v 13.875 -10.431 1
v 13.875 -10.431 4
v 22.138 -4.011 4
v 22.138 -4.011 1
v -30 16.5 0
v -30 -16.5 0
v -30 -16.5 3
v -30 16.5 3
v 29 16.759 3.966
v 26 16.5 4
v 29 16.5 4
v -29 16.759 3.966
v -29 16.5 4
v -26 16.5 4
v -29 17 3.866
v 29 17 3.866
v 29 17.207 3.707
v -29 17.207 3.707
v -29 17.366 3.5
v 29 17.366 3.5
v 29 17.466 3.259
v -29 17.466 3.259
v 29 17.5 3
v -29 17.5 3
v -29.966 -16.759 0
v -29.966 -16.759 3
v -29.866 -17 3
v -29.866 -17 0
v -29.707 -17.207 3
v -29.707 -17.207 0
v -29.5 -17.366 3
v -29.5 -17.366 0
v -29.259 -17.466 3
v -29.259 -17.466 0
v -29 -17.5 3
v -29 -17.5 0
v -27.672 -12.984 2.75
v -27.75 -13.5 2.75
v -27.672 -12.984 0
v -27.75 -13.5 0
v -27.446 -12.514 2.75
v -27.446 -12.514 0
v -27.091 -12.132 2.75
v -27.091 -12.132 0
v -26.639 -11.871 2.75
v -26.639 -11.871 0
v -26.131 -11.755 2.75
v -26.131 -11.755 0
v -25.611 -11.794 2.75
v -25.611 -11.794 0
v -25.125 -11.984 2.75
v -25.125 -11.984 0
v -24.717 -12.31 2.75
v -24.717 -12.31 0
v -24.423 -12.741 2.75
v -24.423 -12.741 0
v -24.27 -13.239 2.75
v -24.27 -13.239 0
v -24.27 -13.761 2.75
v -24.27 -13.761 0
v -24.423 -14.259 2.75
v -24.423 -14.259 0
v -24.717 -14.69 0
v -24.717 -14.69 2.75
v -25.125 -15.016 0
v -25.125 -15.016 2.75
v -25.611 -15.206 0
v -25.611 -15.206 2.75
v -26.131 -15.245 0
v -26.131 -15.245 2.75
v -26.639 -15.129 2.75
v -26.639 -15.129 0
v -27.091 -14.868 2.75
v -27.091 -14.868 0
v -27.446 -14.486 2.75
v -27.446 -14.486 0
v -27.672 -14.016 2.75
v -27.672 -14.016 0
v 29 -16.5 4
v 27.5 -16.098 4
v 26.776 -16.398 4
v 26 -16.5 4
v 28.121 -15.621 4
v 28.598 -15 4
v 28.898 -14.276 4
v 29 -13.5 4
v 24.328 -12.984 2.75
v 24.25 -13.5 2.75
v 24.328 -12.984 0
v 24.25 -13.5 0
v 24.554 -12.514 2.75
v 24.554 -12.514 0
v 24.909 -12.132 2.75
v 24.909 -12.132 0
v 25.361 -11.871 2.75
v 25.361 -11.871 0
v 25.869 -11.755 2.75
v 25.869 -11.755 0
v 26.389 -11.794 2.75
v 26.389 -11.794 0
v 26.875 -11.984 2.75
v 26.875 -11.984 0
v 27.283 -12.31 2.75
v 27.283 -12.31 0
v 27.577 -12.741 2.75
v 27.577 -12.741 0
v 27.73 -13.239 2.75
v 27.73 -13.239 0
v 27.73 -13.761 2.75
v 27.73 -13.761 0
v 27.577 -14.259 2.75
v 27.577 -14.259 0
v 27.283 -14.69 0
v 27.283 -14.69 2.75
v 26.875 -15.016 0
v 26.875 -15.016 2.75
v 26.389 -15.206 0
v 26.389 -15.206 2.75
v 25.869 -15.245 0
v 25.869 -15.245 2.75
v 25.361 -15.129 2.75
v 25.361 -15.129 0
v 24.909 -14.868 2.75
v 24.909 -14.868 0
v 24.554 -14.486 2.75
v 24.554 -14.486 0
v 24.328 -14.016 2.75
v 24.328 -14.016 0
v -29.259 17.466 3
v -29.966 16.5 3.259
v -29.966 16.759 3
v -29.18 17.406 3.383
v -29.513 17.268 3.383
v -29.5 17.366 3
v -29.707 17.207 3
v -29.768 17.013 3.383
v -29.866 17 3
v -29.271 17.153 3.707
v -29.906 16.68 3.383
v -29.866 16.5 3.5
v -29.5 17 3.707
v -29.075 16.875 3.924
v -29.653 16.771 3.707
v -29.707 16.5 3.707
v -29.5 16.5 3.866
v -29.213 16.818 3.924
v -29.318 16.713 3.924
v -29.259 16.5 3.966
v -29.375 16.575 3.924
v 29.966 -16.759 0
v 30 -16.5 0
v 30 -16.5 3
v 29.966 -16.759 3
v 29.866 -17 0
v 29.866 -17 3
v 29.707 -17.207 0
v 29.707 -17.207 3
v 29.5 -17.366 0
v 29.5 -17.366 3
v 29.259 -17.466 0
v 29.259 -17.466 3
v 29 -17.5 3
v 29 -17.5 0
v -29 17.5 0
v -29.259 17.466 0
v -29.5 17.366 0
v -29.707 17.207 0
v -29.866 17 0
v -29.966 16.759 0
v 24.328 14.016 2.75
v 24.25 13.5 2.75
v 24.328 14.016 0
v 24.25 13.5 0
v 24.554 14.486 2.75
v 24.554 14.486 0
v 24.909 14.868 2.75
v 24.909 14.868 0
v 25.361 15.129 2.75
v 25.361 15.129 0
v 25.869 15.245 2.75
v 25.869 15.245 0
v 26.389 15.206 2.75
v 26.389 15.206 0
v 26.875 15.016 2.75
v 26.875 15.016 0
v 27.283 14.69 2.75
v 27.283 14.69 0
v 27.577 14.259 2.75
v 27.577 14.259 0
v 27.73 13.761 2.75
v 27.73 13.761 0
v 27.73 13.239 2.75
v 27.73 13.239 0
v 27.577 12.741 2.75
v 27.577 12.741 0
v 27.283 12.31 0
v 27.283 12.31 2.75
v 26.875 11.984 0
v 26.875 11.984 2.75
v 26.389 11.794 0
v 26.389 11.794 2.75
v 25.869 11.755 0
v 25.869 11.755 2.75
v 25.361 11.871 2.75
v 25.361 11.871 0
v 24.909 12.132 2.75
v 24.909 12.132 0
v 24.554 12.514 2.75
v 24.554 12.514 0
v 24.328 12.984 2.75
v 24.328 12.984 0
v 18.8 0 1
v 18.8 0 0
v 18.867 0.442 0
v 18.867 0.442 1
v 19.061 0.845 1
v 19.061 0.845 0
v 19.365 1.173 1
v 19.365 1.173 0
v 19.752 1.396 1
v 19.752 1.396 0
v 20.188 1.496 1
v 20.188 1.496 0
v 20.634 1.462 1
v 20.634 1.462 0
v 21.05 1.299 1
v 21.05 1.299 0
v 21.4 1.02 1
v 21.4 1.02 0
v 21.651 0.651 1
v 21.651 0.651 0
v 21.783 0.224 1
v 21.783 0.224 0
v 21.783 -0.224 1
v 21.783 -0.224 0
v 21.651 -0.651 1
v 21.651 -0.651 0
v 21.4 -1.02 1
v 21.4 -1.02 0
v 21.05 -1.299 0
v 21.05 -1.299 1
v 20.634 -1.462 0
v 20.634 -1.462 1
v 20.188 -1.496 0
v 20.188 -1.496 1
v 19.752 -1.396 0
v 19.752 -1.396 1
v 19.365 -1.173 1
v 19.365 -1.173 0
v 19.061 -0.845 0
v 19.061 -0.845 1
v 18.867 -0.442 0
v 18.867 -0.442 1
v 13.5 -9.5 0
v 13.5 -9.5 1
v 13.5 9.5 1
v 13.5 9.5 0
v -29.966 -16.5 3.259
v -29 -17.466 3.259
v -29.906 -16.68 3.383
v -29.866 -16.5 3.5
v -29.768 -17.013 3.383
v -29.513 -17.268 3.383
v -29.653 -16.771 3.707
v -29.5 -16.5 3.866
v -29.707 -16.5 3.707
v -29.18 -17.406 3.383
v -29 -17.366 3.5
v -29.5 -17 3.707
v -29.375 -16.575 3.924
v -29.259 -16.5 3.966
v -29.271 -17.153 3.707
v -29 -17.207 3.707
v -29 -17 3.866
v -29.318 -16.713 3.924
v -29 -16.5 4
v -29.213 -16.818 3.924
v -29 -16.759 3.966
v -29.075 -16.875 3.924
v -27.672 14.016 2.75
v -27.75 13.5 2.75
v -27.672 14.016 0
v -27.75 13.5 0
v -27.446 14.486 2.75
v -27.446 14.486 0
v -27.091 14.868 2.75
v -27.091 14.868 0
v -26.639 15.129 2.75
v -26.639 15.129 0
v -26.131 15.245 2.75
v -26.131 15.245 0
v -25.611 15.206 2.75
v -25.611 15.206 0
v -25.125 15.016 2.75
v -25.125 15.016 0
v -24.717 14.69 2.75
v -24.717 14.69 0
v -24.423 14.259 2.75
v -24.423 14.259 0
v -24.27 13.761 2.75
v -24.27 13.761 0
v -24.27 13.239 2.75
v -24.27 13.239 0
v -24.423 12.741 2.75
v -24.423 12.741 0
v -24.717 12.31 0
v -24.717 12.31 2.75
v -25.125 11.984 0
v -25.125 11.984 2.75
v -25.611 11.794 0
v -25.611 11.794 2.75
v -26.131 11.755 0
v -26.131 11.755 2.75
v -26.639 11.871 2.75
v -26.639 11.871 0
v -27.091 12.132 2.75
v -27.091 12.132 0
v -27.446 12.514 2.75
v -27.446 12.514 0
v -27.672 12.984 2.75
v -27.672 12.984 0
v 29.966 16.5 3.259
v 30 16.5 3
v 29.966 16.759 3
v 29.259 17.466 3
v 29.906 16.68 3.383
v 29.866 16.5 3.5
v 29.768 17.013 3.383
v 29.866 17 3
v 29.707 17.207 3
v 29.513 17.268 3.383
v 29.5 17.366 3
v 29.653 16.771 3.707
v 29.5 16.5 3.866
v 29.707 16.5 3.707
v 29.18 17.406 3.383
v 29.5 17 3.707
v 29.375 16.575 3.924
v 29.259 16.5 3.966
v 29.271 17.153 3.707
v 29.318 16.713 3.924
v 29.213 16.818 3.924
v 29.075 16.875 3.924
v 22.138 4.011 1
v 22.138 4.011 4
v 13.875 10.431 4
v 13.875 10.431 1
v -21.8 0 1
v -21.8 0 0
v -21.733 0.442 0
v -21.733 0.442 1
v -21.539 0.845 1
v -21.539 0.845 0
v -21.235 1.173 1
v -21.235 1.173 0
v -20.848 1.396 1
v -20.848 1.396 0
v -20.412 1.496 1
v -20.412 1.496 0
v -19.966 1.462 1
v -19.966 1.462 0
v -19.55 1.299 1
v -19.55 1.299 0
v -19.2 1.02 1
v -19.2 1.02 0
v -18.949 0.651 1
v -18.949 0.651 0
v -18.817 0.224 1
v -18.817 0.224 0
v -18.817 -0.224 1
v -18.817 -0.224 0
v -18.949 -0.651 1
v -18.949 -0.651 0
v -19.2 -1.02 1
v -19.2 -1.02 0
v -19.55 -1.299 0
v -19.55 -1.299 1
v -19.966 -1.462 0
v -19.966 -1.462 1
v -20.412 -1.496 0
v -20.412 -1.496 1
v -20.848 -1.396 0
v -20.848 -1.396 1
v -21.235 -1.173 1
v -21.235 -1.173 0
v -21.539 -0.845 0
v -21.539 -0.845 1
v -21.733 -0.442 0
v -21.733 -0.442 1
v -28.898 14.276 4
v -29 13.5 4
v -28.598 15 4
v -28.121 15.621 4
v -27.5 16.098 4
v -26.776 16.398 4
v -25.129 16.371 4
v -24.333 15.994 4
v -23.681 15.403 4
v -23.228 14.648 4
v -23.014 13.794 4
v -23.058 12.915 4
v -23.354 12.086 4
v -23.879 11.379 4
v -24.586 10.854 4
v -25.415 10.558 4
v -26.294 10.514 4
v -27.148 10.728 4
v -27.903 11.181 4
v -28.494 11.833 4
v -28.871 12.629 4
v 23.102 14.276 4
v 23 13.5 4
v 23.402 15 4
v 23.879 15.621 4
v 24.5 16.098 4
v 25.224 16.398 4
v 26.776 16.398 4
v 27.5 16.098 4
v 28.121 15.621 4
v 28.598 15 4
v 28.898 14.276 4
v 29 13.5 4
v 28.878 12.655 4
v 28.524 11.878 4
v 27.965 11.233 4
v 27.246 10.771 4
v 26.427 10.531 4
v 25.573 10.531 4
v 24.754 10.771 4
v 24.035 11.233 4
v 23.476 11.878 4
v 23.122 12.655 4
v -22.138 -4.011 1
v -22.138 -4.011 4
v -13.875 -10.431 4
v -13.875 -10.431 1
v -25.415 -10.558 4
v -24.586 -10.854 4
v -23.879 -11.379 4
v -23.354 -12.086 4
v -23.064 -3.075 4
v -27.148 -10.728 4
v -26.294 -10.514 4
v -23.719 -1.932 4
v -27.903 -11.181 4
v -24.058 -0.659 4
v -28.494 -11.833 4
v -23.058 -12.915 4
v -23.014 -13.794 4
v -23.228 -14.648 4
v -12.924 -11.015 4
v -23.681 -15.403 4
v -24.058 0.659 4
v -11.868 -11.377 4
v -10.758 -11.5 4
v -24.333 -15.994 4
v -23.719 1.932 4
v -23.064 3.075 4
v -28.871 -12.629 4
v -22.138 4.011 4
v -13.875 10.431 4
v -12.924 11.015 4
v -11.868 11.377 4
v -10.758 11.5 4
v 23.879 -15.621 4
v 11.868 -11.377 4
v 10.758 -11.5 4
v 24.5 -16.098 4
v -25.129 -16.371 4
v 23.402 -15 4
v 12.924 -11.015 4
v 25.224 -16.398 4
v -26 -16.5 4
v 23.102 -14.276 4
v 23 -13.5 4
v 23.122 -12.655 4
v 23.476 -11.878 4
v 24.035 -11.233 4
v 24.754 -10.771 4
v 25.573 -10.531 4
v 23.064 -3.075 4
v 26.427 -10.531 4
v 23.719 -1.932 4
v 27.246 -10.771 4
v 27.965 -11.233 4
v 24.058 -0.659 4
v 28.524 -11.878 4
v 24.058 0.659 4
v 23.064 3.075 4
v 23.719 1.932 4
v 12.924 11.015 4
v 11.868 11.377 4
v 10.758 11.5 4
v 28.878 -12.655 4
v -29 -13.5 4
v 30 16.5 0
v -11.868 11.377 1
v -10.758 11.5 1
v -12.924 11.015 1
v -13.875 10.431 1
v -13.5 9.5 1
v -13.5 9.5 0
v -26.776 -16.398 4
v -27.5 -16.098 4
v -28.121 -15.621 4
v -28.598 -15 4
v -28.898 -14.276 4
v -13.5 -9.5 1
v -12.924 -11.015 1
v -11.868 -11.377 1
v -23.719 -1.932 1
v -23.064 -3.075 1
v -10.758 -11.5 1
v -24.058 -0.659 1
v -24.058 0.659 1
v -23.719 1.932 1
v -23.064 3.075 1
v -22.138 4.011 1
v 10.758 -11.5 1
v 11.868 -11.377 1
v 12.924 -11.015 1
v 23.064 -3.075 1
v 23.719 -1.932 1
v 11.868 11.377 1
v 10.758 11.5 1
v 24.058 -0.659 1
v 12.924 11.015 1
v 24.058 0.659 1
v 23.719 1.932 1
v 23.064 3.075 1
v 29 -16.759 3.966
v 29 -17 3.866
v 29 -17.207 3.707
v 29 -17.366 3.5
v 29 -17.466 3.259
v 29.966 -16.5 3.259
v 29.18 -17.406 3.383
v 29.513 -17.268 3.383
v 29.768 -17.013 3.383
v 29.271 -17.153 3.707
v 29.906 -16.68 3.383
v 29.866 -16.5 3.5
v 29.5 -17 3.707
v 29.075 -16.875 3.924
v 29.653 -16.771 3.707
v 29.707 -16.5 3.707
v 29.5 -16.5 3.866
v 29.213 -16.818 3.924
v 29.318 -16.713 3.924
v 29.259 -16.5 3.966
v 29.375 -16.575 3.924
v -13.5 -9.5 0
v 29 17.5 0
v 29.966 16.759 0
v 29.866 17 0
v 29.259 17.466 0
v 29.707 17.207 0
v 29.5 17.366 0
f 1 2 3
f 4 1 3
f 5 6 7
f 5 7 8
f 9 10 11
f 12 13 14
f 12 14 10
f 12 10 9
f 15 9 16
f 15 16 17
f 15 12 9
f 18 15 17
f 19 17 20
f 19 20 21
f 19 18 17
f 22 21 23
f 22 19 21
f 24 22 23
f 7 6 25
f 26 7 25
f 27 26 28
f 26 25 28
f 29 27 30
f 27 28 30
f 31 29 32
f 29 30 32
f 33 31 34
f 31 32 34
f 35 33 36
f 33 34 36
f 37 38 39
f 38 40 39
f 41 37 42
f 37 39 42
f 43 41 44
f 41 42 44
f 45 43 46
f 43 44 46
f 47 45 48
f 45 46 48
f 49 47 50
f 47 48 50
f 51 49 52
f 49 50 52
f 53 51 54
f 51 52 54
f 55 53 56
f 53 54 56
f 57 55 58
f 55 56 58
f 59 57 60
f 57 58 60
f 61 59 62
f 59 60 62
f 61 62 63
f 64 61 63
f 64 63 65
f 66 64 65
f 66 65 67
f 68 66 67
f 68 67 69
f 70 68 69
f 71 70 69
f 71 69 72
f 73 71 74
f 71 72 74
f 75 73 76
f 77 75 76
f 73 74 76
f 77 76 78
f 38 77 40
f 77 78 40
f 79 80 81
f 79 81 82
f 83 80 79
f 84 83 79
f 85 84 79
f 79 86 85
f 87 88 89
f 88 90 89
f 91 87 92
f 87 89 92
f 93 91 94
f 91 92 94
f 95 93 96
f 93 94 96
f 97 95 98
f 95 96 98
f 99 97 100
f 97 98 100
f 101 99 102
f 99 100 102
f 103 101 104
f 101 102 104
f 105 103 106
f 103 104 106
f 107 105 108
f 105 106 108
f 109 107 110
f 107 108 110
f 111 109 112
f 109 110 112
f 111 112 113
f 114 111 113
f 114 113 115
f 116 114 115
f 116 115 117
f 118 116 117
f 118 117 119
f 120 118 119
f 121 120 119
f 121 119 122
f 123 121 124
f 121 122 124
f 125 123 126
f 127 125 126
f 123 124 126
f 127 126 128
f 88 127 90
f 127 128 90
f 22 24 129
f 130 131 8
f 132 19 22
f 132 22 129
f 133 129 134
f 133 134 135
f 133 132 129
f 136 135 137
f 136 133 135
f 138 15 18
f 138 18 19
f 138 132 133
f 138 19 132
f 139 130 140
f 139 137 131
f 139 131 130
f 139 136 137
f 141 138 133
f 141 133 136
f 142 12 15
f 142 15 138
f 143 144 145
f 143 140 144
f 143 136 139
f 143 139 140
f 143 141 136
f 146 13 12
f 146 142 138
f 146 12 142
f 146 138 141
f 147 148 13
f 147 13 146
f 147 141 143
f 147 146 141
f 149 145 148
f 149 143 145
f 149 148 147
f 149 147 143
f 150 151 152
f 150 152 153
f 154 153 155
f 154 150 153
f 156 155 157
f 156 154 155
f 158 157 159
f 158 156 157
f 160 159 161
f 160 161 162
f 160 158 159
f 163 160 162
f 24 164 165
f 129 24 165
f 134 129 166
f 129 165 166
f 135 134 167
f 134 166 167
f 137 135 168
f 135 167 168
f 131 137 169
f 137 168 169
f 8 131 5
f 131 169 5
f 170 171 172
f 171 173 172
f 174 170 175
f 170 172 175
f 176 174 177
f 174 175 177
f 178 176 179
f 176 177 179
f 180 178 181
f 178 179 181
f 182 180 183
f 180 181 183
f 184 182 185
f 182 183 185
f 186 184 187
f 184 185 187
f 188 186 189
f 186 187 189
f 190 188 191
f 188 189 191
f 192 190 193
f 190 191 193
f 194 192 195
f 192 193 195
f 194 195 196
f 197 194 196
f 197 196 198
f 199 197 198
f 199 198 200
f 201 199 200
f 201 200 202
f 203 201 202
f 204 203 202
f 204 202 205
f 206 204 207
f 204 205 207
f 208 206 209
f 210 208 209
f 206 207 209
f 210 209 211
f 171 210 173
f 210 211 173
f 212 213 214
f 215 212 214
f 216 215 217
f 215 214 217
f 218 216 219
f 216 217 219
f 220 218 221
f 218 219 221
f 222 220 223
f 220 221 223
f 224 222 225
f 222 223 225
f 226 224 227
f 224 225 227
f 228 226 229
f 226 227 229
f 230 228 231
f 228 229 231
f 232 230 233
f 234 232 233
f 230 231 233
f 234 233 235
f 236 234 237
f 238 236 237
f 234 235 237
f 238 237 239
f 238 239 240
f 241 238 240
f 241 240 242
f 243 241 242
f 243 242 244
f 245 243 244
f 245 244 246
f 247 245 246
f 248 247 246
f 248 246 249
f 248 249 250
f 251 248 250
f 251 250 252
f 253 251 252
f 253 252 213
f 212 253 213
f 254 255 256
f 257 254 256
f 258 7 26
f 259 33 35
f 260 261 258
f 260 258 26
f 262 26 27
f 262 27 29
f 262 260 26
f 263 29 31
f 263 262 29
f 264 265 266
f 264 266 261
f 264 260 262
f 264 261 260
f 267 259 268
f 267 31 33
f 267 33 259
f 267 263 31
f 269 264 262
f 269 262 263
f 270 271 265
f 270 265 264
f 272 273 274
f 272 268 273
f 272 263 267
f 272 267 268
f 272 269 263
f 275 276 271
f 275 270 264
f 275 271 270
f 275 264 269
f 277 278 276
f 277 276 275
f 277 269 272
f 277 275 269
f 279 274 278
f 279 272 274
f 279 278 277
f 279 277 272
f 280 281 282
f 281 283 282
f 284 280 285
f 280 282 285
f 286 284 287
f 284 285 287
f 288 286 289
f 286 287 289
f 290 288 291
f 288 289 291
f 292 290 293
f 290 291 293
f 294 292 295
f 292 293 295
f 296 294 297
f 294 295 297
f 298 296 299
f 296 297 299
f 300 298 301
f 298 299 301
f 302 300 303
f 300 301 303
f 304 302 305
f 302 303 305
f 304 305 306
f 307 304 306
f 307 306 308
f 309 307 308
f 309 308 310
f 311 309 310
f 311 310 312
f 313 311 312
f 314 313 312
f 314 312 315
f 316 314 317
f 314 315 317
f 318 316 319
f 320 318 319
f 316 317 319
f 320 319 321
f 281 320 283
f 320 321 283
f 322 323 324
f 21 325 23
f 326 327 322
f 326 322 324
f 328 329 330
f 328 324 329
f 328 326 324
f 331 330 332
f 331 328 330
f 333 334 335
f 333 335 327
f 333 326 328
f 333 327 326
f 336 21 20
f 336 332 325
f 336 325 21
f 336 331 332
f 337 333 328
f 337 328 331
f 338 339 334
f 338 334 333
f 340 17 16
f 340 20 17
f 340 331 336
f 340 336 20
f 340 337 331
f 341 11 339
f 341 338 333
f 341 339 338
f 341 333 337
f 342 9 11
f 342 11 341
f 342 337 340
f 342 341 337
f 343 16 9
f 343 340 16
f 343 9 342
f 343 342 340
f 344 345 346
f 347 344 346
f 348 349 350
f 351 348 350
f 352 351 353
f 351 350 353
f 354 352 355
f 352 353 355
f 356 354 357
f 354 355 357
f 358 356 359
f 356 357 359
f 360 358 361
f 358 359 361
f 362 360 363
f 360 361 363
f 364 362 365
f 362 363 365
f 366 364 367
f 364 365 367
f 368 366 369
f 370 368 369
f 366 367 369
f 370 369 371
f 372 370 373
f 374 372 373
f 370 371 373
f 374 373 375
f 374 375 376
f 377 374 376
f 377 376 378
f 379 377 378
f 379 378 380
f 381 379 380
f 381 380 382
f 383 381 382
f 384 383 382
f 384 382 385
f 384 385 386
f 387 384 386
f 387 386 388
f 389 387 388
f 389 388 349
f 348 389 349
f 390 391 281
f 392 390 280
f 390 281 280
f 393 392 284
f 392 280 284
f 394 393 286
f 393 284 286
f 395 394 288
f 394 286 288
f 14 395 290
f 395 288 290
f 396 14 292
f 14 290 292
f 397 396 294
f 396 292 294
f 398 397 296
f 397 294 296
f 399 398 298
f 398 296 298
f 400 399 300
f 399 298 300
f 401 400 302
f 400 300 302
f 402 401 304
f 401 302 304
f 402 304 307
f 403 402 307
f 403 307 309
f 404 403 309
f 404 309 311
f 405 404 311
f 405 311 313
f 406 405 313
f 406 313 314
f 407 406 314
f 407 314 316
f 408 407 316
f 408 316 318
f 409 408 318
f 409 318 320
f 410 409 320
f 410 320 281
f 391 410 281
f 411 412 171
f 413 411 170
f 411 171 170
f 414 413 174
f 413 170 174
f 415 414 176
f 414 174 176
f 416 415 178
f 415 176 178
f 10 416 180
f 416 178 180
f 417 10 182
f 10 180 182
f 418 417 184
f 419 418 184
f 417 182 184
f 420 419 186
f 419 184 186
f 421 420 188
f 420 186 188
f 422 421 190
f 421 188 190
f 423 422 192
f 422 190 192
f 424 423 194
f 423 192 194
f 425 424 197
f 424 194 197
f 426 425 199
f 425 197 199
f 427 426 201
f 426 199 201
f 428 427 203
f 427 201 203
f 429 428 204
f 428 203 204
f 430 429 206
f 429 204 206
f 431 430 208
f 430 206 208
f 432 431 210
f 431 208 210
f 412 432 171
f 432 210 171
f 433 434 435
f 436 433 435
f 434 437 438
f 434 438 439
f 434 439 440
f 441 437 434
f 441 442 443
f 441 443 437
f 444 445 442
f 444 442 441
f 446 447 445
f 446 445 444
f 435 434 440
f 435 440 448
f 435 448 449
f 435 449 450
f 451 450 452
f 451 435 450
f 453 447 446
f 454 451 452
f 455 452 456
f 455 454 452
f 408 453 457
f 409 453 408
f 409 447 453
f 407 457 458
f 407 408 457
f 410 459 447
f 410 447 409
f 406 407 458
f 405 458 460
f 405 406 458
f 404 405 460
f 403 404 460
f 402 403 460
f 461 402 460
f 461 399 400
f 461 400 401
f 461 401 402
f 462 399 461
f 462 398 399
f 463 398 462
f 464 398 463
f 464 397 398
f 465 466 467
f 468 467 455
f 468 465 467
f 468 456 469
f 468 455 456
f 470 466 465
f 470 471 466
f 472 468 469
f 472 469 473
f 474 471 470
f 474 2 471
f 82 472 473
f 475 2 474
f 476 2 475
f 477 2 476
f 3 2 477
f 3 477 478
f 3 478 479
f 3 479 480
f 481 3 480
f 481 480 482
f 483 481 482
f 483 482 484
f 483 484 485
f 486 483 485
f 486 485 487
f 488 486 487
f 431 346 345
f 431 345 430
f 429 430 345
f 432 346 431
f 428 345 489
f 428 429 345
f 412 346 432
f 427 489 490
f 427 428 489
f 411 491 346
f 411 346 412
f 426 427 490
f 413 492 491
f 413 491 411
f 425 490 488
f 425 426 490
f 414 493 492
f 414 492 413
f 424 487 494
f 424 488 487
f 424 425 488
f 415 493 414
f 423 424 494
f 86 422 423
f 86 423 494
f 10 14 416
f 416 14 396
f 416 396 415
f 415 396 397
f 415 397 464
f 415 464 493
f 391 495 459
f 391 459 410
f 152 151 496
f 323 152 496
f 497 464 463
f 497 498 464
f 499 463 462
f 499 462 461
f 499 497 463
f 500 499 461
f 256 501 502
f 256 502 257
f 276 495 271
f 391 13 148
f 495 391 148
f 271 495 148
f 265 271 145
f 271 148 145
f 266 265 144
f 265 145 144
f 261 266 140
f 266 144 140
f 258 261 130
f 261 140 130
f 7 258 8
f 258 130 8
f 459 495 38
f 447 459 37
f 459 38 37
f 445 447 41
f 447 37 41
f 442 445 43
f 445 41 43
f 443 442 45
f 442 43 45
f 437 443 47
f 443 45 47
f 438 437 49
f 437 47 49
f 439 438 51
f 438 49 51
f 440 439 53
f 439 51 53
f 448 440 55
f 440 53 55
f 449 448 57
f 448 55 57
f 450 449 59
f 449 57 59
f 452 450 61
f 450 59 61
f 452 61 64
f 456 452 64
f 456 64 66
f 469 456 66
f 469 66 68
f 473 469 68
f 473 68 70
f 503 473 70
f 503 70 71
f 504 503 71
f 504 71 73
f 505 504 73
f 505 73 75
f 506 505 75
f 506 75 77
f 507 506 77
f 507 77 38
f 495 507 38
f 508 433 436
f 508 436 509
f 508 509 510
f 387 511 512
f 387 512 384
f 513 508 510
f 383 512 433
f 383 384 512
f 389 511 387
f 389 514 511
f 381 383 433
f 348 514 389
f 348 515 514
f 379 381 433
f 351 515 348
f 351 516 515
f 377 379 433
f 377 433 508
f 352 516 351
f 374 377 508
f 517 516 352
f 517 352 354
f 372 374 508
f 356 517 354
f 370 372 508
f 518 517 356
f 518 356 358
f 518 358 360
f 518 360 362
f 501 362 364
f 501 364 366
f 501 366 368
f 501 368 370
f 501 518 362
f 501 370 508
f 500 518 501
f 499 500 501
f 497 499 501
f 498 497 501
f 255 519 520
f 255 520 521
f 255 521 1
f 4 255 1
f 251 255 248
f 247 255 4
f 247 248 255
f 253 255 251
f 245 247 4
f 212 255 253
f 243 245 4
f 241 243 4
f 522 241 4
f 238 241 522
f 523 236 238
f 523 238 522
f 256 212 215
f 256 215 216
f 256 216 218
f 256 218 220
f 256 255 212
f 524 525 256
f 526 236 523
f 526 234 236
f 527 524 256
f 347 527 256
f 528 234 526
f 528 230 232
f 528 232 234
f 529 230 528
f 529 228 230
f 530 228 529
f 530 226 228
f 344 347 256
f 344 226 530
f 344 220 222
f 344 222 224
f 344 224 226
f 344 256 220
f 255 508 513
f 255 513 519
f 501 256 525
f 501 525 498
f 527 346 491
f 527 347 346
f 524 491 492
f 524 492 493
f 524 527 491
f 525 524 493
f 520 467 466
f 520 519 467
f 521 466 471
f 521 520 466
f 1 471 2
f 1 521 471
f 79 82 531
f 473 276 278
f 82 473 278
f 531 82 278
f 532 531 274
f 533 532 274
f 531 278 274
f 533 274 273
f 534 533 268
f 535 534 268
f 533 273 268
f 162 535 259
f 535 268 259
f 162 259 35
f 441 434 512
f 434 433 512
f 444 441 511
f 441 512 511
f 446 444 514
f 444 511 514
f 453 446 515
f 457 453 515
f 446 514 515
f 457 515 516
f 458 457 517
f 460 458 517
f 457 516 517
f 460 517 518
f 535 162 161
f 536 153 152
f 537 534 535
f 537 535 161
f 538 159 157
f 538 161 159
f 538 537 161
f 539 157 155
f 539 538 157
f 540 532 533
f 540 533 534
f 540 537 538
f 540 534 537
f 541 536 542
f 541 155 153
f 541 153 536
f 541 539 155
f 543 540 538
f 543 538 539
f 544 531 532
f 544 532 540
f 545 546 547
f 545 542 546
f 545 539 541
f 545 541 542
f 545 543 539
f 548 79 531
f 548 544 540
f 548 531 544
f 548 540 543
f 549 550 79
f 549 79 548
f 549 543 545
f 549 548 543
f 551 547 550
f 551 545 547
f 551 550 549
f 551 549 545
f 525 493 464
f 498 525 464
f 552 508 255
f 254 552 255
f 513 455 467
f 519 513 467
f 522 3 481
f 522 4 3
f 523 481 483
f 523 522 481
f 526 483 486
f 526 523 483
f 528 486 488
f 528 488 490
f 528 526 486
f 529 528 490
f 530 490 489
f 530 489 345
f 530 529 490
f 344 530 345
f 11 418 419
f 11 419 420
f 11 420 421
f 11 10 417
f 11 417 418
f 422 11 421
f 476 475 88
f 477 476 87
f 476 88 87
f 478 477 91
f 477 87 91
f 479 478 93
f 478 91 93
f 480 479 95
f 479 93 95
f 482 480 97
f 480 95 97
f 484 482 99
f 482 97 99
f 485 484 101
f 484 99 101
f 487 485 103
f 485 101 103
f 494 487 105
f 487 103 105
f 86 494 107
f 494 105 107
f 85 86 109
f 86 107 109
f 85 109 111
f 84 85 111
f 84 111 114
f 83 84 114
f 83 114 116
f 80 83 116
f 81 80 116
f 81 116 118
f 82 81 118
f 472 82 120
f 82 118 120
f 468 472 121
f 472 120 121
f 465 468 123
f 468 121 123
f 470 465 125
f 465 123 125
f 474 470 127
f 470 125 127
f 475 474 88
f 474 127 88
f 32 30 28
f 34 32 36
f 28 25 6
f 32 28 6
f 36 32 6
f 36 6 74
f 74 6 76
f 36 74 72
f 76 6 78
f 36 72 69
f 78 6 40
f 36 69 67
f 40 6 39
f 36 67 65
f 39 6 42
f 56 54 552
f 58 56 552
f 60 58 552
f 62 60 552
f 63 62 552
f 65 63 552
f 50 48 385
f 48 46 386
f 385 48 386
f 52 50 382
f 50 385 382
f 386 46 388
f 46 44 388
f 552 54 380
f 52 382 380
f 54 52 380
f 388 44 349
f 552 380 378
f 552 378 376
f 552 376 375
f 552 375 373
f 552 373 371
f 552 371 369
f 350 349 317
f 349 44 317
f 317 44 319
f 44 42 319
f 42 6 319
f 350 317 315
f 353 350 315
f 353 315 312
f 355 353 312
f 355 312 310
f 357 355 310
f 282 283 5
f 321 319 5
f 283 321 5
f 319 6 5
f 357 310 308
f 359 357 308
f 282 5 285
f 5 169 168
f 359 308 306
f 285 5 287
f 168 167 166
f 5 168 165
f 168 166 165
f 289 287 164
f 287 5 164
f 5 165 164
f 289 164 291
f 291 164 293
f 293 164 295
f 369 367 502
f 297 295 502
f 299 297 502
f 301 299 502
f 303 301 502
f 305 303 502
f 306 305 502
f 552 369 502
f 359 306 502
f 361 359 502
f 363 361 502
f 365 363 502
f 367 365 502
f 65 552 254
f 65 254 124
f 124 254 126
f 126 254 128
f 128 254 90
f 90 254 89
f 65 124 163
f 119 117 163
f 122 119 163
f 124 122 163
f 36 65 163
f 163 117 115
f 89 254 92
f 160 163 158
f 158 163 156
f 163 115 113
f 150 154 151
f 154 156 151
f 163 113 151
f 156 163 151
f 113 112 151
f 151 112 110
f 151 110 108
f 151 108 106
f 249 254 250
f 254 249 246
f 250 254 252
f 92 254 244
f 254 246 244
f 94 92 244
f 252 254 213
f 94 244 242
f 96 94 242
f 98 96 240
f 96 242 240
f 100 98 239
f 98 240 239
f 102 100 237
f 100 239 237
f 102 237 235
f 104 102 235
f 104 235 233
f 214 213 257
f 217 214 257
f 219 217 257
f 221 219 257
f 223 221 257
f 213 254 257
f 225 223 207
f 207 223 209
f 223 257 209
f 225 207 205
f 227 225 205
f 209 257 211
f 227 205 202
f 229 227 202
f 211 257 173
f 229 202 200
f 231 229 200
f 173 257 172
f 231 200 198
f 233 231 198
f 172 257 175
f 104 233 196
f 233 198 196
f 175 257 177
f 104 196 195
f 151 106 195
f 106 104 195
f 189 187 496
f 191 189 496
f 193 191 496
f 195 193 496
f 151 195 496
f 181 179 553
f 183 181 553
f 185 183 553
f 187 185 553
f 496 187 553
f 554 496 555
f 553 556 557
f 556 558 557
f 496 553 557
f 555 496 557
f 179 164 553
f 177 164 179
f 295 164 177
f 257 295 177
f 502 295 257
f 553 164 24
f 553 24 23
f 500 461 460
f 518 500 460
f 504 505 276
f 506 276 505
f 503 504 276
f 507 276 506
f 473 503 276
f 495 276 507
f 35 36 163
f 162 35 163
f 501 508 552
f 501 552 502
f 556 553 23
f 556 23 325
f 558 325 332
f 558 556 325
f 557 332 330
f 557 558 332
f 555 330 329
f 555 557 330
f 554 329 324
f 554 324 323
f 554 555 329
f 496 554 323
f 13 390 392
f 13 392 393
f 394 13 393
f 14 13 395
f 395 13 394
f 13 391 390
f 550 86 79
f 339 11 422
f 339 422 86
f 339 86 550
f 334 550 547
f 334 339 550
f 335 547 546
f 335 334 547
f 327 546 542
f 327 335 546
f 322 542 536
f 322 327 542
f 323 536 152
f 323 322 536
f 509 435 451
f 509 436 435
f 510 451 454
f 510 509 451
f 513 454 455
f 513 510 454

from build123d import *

# Parameters (mm, degrees)
F0_W           = 60
F0_H           = 35
F1_DEPTH       = 4
F3_DEPTH       = 3
F4_R           = 5.08
F5_W           = 27
F5_H           = 19
F6_DEPTH       = 25.4
F8_D           = 3.5
F8_CSINK_D     = 6
F8_CSINK_ANGLE = 90
F9_D           = 3
F10_T1_DEPTH   = 58
F10_T3_DEPTH   = 33
F10_T5_DEPTH   = 5.5
F10_S9_W       = 1
F10_S9_H       = 1
F10_T10_DEPTH  = 1
F10_S15_W      = 1
F10_S15_H      = 1
F10_T16_DEPTH  = 1
F10_S21_W      = 1
F10_S21_H      = 1
F10_T22_DEPTH  = 1
F10_S27_W      = 1
F10_S27_H      = 1
F10_T28_DEPTH  = 1


# Not quite as in the source:
# - a fillet or chamfer that OpenCascade refuses, or shapes differently, is made with other operations: its cross-section is extruded or revolved along the edge and cut away or added


with BuildPart() as f1:
    # F0 (on Top) → F1 (new body)
    with BuildSketch(Plane.XY):
        Rectangle(F0_W, F0_H)
    extrude(amount=F1_DEPTH)

    # F2 (on face) → F3 (cut)
    with BuildSketch(Plane.XY.offset(4)):
        Polygon((-27.3, 0), (-12.5, -11.5), (12.5, -11.5), (27.3, 0), (12.5, 11.5), (-12.5, 11.5), align=None)
    extrude(amount=-F3_DEPTH, mode=Mode.SUBTRACT)

    # F4
    f4_edges = [f1.edges().sort_by_distance(p)[0] for p in [
        (12.5, 11.5, 2.5),
        (12.5, -11.5, 2.5),
        (-12.5, -11.5, 2.5),
        (-12.5, 11.5, 2.5),
        (27.3, 0, 2.5),
        (-27.3, 0, 2.5),
    ]]
    fillet(f4_edges, radius=F4_R)

    # F5 (on face) → F6 (cut)
    with BuildSketch(Plane.XY.offset(1)):
        Rectangle(F5_W, F5_H)
    extrude(amount=-F6_DEPTH, mode=Mode.SUBTRACT)

    # F8 (through all)
    with Locations(Plane.XY.offset(4)):
        with Locations((-26, 13.5), (26, 13.5), (26, -13.5), (-26, -13.5)):
            CounterSinkHole(F8_D / 2, F8_CSINK_D / 2, counter_sink_angle=F8_CSINK_ANGLE)

    # F9 (through all)
    with Locations(Plane.XY.offset(4)):
        with Locations((-20.3, 0), (20.3, 0)):
            Hole(F9_D / 2)

    # F10: fillet of radius 1 on 8 edges, made by hand

    # F10_s2 → F10_t1 (cut)
    with BuildSketch(Plane.YZ.offset(-29)):
        with BuildLine():
            ThreePointArc((16.5, 4), (17.2071067812, 3.7071067812), (17.5, 3))
            Line((17.5, 3), (17.5, 4))
            Line((17.5, 4), (16.5, 4))
        make_face()
        with BuildLine():
            ThreePointArc((-16.5, 4), (-17.2071067812, 3.7071067812), (-17.5, 3))
            Line((-17.5, 3), (-17.5, 4))
            Line((-17.5, 4), (-16.5, 4))
        make_face()
    extrude(amount=F10_T1_DEPTH, mode=Mode.SUBTRACT)

    # F10_s4 → F10_t3 (cut)
    with BuildSketch(Plane.XZ.offset(-16.5)):
        with BuildLine():
            ThreePointArc((-29, 4), (-29.7071067812, 3.7071067812), (-30, 3))
            Line((-30, 3), (-30, 4))
            Line((-30, 4), (-29, 4))
        make_face()
        with BuildLine():
            ThreePointArc((29, 4), (29.7071067812, 3.7071067812), (30, 3))
            Line((30, 3), (30, 4))
            Line((30, 4), (29, 4))
        make_face()
    extrude(amount=F10_T3_DEPTH, mode=Mode.SUBTRACT)

    # F10_s6 → F10_t5 (cut)
    with BuildSketch(Plane.XY.offset(-2.5)):
        with BuildLine():
            ThreePointArc((30, -16.5), (29.7071067812, -17.2071067812), (29, -17.5))
            Line((29, -17.5), (30, -17.5))
            Line((30, -17.5), (30, -16.5))
        make_face()
        with BuildLine():
            ThreePointArc((29, 17.5), (29.7071067812, 17.2071067812), (30, 16.5))
            Line((30, 16.5), (30, 17.5))
            Line((30, 17.5), (29, 17.5))
        make_face()
        with BuildLine():
            ThreePointArc((-30, -16.5), (-29.7071067812, -17.2071067812), (-29, -17.5))
            Line((-29, -17.5), (-30, -17.5))
            Line((-30, -17.5), (-30, -16.5))
        make_face()
        with BuildLine():
            ThreePointArc((-29, 17.5), (-29.7071067812, 17.2071067812), (-30, 16.5))
            Line((-30, 16.5), (-30, 17.5))
            Line((-30, 17.5), (-29, 17.5))
        make_face()
    extrude(amount=F10_T5_DEPTH, mode=Mode.SUBTRACT)


with BuildPart() as f10_tool8:
    # F10_s9 → F10_t10 (new body)
    with BuildSketch(Plane.XY.offset(3)):
        with Locations((29.5, 17)):
            Rectangle(F10_S9_W, F10_S9_H)
    extrude(amount=F10_T10_DEPTH)

    # F10_s11 → F10_t12 (revolve, cut)
    with BuildSketch(Plane(origin=(29, 16.5, 3), x_dir=(-0.7071067812, -0.7071067812, 0), z_dir=(-0.7071067812, 0.7071067812, 0))):
        with BuildLine():
            ThreePointArc((0, -1), (1, 0), (0, 1))
            Line((0, 1), (0, -1))
        make_face()
    revolve(axis=Axis((29, 16.5, 3), (0, 0, 1)), mode=Mode.SUBTRACT)


with BuildPart() as f1_1:
    add(f1.part)

    # F10_t7: cut F10_tool8
    add(f10_tool8.part, mode=Mode.SUBTRACT)


with BuildPart() as f10_tool14:
    # F10_s15 → F10_t16 (new body)
    with BuildSketch(Plane.XY.offset(3)):
        with Locations((-29.5, 17)):
            Rectangle(F10_S15_W, F10_S15_H)
    extrude(amount=F10_T16_DEPTH)

    # F10_s17 → F10_t18 (revolve, cut)
    with BuildSketch(Plane(origin=(-29, 16.5, 3), x_dir=(0.7071067812, -0.7071067812, 0), z_dir=(-0.7071067812, -0.7071067812, 0))):
        with BuildLine():
            ThreePointArc((0, -1), (1, 0), (0, 1))
            Line((0, 1), (0, -1))
        make_face()
    revolve(axis=Axis((-29, 16.5, 3), (0, 0, 1)), mode=Mode.SUBTRACT)


with BuildPart() as f1_2:
    add(f1_1.part)

    # F10_t13: cut F10_tool14
    add(f10_tool14.part, mode=Mode.SUBTRACT)


with BuildPart() as f10_tool20:
    # F10_s21 → F10_t22 (new body)
    with BuildSketch(Plane.XY.offset(3)):
        with Locations((-29.5, -17)):
            Rectangle(F10_S21_W, F10_S21_H)
    extrude(amount=F10_T22_DEPTH)

    # F10_s23 → F10_t24 (revolve, cut)
    with BuildSketch(Plane(origin=(-29, -16.5, 3), x_dir=(0.7071067812, 0.7071067812, 0), z_dir=(0.7071067812, -0.7071067812, 0))):
        with BuildLine():
            ThreePointArc((0, -1), (1, 0), (0, 1))
            Line((0, 1), (0, -1))
        make_face()
    revolve(axis=Axis((-29, -16.5, 3), (0, 0, 1)), mode=Mode.SUBTRACT)


with BuildPart() as f1_3:
    add(f1_2.part)

    # F10_t19: cut F10_tool20
    add(f10_tool20.part, mode=Mode.SUBTRACT)


with BuildPart() as f10_tool26:
    # F10_s27 → F10_t28 (new body)
    with BuildSketch(Plane.XY.offset(3)):
        with Locations((29.5, -17)):
            Rectangle(F10_S27_W, F10_S27_H)
    extrude(amount=F10_T28_DEPTH)

    # F10_s29 → F10_t30 (revolve, cut)
    with BuildSketch(Plane(origin=(29, -16.5, 3), x_dir=(-0.7071067812, 0.7071067812, 0), z_dir=(0.7071067812, 0.7071067812, 0))):
        with BuildLine():
            ThreePointArc((0, -1), (1, 0), (0, 1))
            Line((0, 1), (0, -1))
        make_face()
    revolve(axis=Axis((29, -16.5, 3), (0, 0, 1)), mode=Mode.SUBTRACT)


with BuildPart() as f1_4:
    add(f1_3.part)

    # F10_t25: cut F10_tool26
    add(f10_tool26.part, mode=Mode.SUBTRACT)


solid = f1_4.part
